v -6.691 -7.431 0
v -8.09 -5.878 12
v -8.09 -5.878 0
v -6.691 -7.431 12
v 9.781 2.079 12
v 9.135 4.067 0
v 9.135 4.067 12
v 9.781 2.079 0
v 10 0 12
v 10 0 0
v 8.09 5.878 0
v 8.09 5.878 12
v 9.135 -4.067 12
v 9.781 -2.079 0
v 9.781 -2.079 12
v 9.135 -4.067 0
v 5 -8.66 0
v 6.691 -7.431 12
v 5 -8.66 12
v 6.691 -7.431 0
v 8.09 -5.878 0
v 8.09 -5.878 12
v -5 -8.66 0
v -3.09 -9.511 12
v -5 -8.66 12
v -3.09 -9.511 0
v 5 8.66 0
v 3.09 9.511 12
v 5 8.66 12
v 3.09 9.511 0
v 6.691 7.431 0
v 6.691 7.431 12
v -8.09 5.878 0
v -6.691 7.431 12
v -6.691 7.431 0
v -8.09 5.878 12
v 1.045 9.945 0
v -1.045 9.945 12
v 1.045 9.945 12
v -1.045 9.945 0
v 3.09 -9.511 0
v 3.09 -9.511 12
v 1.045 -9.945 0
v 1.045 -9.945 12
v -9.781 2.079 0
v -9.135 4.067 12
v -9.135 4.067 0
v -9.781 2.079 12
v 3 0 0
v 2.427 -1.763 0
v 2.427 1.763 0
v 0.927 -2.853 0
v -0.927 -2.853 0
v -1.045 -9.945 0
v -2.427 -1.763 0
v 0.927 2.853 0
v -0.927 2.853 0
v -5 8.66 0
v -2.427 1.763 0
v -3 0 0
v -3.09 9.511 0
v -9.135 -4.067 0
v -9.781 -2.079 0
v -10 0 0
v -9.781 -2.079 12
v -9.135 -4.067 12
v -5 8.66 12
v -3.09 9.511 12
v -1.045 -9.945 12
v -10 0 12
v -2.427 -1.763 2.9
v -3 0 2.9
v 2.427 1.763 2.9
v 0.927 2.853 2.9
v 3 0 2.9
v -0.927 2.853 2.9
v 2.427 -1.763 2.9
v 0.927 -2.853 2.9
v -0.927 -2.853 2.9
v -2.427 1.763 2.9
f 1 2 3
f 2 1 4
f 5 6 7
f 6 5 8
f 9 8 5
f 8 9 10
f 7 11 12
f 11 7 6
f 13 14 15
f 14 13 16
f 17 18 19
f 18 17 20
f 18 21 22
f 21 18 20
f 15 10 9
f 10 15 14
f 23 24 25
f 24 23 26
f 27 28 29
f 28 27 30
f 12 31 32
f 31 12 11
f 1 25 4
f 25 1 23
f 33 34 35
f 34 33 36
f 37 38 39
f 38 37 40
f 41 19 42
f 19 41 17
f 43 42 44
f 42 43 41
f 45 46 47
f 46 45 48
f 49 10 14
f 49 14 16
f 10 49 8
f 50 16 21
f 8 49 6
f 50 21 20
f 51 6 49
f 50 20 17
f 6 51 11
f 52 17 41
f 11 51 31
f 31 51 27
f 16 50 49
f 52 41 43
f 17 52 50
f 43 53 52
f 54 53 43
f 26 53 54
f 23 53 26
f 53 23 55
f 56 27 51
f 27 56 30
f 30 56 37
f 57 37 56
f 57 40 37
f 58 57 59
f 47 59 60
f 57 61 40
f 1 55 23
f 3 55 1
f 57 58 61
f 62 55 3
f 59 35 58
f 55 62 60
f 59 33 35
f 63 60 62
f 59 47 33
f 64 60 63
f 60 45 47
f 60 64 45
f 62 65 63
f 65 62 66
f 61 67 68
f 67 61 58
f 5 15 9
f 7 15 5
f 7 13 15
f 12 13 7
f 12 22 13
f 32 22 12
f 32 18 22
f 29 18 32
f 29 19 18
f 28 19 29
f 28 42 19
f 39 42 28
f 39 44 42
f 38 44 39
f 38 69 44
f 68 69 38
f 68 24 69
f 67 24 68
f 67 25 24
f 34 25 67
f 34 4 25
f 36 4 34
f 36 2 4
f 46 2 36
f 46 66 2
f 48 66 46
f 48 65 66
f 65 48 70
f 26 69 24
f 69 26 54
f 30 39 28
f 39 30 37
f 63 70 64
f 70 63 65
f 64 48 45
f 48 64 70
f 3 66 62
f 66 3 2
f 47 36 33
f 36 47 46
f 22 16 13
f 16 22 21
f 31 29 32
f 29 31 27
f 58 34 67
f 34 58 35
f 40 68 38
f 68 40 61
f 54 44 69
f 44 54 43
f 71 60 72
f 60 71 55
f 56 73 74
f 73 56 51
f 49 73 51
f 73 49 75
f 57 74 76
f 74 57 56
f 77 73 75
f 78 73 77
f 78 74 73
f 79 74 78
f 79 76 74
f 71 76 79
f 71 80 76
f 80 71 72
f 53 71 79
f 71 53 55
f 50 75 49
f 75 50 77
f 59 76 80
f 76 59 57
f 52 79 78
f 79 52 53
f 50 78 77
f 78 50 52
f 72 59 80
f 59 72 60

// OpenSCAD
difference() {
  cylinder(h = 12, d = 20);
  translate([0,0,-0.1]) cylinder(h = 3, d = 6);
}
